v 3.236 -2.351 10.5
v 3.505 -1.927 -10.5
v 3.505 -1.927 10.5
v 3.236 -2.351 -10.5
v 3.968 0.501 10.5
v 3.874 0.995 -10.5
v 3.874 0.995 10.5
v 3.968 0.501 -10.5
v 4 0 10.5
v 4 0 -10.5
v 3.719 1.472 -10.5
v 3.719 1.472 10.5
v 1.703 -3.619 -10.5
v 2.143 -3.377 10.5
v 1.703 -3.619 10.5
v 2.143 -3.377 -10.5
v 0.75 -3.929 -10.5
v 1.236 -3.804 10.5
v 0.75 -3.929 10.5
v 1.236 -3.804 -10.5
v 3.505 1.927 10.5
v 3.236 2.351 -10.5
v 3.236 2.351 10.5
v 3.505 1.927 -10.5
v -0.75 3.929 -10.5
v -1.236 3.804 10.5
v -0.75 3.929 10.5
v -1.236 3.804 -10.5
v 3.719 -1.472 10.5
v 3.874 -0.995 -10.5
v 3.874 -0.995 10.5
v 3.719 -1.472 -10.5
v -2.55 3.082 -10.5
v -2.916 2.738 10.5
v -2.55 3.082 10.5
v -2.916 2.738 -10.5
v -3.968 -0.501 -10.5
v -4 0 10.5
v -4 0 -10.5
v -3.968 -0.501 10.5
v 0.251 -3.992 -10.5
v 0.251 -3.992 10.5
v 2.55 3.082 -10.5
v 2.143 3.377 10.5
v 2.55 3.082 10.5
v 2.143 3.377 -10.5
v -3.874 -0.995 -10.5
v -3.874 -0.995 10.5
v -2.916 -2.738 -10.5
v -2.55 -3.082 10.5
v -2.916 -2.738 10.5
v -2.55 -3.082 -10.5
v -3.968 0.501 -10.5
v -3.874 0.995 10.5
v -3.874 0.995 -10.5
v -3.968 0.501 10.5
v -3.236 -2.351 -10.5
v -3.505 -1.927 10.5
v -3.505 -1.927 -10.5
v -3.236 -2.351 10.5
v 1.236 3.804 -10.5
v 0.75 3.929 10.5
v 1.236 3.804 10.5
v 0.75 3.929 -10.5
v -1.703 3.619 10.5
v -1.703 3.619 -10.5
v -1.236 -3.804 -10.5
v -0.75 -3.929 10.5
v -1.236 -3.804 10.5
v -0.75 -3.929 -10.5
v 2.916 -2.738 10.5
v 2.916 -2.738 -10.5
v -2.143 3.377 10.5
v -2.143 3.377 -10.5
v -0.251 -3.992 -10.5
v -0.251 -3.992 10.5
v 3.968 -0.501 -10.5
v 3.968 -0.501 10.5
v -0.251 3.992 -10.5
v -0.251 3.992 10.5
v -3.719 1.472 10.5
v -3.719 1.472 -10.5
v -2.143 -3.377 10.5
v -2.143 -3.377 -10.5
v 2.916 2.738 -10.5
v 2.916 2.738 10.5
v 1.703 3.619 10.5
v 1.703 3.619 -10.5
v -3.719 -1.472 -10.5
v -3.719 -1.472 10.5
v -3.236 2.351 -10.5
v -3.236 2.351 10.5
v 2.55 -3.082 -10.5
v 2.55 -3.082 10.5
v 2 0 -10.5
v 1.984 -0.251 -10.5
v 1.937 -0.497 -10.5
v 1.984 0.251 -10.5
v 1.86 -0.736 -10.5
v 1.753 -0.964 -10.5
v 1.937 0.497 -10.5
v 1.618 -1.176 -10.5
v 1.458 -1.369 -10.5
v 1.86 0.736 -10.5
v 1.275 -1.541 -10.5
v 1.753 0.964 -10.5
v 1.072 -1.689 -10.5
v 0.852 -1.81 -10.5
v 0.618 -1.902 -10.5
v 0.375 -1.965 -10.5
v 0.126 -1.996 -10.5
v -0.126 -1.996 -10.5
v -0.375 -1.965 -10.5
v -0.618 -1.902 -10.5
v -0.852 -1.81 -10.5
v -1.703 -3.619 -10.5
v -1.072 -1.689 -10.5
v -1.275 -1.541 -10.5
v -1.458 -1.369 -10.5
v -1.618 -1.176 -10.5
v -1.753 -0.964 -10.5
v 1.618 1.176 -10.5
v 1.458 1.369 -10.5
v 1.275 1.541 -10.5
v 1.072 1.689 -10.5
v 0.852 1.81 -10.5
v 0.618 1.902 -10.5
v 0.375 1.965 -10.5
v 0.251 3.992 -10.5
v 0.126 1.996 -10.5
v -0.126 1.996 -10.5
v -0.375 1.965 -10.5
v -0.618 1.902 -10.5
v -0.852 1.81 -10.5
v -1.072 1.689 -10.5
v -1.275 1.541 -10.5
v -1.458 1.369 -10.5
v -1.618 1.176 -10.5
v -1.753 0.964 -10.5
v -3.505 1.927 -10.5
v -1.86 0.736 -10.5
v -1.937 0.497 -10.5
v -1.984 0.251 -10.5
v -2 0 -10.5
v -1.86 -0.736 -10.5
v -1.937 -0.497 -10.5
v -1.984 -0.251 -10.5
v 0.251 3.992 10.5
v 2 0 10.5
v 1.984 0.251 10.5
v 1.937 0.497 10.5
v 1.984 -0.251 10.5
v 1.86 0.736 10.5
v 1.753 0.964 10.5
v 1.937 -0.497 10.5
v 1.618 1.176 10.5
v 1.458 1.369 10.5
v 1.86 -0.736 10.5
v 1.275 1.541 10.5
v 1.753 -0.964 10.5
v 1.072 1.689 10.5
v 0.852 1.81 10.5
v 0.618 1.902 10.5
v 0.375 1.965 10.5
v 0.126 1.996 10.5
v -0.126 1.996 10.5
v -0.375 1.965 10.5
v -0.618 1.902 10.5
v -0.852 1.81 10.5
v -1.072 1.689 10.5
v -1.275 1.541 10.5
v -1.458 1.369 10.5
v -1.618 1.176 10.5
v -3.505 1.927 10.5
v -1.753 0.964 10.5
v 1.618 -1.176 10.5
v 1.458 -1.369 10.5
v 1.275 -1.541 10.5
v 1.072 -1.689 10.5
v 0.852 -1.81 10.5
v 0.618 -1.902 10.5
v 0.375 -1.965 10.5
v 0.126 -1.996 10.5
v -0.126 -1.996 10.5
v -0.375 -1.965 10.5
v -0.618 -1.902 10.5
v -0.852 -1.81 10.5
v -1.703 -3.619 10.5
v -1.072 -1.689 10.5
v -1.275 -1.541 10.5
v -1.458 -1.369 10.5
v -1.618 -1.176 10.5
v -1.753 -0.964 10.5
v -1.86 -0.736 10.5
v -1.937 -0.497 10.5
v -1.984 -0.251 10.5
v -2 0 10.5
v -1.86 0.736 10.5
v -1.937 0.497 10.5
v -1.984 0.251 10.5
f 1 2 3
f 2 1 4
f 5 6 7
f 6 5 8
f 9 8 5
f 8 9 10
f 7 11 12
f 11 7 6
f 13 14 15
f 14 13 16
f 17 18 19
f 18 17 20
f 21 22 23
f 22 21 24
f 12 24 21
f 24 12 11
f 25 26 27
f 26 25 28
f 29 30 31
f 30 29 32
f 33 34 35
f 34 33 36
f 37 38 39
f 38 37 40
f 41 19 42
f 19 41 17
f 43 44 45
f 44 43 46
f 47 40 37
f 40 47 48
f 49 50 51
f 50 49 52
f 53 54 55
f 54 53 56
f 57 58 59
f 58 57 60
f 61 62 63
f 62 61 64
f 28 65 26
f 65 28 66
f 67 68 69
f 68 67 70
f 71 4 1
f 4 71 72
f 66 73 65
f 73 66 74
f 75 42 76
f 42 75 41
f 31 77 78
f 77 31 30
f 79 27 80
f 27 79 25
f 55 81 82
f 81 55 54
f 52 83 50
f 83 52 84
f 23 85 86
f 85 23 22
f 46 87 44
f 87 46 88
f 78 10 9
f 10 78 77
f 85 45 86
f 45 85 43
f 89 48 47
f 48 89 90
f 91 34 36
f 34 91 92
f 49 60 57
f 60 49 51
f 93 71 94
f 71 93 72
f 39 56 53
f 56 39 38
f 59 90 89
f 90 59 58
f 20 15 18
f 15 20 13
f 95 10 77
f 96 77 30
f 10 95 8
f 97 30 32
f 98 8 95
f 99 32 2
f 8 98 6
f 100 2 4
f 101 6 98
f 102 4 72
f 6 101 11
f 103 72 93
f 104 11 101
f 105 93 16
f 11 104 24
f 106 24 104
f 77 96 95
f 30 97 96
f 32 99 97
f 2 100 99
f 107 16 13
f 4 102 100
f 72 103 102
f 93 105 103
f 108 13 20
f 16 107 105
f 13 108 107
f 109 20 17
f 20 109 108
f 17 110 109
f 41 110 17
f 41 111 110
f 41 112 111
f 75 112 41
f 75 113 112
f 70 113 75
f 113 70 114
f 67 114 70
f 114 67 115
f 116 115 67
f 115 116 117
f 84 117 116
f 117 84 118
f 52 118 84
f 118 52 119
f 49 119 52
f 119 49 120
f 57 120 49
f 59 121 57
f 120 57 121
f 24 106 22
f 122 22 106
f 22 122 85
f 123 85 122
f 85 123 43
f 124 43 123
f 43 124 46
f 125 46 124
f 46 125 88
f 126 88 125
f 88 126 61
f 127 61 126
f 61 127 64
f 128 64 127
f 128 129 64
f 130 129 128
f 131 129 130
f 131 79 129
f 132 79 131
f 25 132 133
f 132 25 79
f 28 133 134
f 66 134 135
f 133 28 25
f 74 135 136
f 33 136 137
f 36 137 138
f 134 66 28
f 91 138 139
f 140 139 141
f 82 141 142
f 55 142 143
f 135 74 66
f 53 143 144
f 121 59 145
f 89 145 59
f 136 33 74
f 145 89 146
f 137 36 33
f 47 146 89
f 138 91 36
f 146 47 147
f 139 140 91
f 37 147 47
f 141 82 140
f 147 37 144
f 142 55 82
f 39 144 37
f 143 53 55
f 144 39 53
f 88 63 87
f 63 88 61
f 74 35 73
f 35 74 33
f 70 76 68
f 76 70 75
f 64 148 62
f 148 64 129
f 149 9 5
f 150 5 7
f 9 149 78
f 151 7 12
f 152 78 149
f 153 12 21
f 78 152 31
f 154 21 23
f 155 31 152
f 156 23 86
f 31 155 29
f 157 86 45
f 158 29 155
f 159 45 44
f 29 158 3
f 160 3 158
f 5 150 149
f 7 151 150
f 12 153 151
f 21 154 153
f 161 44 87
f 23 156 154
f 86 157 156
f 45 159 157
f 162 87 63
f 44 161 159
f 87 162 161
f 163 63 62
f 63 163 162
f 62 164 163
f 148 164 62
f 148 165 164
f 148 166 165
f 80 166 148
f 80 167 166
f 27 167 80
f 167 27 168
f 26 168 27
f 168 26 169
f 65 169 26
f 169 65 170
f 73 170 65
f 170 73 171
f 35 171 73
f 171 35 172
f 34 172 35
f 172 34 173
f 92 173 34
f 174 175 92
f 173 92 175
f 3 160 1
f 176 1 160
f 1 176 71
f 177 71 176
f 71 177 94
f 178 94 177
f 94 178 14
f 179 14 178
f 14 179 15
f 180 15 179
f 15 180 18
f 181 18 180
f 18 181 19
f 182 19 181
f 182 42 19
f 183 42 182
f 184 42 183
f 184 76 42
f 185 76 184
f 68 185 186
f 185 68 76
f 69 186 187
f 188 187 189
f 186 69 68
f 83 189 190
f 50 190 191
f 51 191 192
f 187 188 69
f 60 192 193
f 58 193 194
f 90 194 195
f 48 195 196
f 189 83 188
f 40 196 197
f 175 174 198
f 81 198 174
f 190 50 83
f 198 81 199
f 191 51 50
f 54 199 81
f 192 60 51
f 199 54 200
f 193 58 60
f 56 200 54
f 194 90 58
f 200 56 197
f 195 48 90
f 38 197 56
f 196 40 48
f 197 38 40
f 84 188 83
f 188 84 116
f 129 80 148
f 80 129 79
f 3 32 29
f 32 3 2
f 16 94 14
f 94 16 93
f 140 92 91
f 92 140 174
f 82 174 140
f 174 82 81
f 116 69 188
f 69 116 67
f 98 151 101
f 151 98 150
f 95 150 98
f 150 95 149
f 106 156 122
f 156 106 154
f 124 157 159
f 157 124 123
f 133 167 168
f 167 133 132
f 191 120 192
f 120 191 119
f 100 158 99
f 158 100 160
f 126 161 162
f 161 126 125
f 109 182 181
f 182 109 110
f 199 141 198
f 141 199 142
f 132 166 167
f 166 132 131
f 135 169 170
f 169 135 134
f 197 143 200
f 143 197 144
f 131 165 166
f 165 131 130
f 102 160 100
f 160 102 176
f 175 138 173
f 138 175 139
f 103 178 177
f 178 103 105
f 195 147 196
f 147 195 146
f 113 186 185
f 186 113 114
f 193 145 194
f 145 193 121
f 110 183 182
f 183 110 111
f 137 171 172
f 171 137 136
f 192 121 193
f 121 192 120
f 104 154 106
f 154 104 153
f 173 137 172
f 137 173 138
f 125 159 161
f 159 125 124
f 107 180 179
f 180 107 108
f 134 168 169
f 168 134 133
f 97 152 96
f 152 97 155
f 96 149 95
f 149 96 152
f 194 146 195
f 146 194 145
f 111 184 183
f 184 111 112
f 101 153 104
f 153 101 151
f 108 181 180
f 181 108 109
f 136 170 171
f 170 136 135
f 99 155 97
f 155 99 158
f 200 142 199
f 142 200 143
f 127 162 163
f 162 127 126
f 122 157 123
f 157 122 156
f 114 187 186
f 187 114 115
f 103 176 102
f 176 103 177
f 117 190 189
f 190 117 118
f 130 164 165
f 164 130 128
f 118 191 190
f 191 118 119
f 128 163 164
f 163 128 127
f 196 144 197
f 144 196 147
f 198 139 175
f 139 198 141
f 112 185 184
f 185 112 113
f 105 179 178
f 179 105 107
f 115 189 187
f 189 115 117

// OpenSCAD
$fn = 50;


difference() {
	union() {
		translate(v = [0, 0, -10.5000000000]) {
			cylinder(h = 21, r = 4.0000000000);
		}
	}
	union() {
		translate(v = [0, 0, -100.0000000000]) {
			cylinder(h = 200, r = 2.0000000000);
		}
	}
}
